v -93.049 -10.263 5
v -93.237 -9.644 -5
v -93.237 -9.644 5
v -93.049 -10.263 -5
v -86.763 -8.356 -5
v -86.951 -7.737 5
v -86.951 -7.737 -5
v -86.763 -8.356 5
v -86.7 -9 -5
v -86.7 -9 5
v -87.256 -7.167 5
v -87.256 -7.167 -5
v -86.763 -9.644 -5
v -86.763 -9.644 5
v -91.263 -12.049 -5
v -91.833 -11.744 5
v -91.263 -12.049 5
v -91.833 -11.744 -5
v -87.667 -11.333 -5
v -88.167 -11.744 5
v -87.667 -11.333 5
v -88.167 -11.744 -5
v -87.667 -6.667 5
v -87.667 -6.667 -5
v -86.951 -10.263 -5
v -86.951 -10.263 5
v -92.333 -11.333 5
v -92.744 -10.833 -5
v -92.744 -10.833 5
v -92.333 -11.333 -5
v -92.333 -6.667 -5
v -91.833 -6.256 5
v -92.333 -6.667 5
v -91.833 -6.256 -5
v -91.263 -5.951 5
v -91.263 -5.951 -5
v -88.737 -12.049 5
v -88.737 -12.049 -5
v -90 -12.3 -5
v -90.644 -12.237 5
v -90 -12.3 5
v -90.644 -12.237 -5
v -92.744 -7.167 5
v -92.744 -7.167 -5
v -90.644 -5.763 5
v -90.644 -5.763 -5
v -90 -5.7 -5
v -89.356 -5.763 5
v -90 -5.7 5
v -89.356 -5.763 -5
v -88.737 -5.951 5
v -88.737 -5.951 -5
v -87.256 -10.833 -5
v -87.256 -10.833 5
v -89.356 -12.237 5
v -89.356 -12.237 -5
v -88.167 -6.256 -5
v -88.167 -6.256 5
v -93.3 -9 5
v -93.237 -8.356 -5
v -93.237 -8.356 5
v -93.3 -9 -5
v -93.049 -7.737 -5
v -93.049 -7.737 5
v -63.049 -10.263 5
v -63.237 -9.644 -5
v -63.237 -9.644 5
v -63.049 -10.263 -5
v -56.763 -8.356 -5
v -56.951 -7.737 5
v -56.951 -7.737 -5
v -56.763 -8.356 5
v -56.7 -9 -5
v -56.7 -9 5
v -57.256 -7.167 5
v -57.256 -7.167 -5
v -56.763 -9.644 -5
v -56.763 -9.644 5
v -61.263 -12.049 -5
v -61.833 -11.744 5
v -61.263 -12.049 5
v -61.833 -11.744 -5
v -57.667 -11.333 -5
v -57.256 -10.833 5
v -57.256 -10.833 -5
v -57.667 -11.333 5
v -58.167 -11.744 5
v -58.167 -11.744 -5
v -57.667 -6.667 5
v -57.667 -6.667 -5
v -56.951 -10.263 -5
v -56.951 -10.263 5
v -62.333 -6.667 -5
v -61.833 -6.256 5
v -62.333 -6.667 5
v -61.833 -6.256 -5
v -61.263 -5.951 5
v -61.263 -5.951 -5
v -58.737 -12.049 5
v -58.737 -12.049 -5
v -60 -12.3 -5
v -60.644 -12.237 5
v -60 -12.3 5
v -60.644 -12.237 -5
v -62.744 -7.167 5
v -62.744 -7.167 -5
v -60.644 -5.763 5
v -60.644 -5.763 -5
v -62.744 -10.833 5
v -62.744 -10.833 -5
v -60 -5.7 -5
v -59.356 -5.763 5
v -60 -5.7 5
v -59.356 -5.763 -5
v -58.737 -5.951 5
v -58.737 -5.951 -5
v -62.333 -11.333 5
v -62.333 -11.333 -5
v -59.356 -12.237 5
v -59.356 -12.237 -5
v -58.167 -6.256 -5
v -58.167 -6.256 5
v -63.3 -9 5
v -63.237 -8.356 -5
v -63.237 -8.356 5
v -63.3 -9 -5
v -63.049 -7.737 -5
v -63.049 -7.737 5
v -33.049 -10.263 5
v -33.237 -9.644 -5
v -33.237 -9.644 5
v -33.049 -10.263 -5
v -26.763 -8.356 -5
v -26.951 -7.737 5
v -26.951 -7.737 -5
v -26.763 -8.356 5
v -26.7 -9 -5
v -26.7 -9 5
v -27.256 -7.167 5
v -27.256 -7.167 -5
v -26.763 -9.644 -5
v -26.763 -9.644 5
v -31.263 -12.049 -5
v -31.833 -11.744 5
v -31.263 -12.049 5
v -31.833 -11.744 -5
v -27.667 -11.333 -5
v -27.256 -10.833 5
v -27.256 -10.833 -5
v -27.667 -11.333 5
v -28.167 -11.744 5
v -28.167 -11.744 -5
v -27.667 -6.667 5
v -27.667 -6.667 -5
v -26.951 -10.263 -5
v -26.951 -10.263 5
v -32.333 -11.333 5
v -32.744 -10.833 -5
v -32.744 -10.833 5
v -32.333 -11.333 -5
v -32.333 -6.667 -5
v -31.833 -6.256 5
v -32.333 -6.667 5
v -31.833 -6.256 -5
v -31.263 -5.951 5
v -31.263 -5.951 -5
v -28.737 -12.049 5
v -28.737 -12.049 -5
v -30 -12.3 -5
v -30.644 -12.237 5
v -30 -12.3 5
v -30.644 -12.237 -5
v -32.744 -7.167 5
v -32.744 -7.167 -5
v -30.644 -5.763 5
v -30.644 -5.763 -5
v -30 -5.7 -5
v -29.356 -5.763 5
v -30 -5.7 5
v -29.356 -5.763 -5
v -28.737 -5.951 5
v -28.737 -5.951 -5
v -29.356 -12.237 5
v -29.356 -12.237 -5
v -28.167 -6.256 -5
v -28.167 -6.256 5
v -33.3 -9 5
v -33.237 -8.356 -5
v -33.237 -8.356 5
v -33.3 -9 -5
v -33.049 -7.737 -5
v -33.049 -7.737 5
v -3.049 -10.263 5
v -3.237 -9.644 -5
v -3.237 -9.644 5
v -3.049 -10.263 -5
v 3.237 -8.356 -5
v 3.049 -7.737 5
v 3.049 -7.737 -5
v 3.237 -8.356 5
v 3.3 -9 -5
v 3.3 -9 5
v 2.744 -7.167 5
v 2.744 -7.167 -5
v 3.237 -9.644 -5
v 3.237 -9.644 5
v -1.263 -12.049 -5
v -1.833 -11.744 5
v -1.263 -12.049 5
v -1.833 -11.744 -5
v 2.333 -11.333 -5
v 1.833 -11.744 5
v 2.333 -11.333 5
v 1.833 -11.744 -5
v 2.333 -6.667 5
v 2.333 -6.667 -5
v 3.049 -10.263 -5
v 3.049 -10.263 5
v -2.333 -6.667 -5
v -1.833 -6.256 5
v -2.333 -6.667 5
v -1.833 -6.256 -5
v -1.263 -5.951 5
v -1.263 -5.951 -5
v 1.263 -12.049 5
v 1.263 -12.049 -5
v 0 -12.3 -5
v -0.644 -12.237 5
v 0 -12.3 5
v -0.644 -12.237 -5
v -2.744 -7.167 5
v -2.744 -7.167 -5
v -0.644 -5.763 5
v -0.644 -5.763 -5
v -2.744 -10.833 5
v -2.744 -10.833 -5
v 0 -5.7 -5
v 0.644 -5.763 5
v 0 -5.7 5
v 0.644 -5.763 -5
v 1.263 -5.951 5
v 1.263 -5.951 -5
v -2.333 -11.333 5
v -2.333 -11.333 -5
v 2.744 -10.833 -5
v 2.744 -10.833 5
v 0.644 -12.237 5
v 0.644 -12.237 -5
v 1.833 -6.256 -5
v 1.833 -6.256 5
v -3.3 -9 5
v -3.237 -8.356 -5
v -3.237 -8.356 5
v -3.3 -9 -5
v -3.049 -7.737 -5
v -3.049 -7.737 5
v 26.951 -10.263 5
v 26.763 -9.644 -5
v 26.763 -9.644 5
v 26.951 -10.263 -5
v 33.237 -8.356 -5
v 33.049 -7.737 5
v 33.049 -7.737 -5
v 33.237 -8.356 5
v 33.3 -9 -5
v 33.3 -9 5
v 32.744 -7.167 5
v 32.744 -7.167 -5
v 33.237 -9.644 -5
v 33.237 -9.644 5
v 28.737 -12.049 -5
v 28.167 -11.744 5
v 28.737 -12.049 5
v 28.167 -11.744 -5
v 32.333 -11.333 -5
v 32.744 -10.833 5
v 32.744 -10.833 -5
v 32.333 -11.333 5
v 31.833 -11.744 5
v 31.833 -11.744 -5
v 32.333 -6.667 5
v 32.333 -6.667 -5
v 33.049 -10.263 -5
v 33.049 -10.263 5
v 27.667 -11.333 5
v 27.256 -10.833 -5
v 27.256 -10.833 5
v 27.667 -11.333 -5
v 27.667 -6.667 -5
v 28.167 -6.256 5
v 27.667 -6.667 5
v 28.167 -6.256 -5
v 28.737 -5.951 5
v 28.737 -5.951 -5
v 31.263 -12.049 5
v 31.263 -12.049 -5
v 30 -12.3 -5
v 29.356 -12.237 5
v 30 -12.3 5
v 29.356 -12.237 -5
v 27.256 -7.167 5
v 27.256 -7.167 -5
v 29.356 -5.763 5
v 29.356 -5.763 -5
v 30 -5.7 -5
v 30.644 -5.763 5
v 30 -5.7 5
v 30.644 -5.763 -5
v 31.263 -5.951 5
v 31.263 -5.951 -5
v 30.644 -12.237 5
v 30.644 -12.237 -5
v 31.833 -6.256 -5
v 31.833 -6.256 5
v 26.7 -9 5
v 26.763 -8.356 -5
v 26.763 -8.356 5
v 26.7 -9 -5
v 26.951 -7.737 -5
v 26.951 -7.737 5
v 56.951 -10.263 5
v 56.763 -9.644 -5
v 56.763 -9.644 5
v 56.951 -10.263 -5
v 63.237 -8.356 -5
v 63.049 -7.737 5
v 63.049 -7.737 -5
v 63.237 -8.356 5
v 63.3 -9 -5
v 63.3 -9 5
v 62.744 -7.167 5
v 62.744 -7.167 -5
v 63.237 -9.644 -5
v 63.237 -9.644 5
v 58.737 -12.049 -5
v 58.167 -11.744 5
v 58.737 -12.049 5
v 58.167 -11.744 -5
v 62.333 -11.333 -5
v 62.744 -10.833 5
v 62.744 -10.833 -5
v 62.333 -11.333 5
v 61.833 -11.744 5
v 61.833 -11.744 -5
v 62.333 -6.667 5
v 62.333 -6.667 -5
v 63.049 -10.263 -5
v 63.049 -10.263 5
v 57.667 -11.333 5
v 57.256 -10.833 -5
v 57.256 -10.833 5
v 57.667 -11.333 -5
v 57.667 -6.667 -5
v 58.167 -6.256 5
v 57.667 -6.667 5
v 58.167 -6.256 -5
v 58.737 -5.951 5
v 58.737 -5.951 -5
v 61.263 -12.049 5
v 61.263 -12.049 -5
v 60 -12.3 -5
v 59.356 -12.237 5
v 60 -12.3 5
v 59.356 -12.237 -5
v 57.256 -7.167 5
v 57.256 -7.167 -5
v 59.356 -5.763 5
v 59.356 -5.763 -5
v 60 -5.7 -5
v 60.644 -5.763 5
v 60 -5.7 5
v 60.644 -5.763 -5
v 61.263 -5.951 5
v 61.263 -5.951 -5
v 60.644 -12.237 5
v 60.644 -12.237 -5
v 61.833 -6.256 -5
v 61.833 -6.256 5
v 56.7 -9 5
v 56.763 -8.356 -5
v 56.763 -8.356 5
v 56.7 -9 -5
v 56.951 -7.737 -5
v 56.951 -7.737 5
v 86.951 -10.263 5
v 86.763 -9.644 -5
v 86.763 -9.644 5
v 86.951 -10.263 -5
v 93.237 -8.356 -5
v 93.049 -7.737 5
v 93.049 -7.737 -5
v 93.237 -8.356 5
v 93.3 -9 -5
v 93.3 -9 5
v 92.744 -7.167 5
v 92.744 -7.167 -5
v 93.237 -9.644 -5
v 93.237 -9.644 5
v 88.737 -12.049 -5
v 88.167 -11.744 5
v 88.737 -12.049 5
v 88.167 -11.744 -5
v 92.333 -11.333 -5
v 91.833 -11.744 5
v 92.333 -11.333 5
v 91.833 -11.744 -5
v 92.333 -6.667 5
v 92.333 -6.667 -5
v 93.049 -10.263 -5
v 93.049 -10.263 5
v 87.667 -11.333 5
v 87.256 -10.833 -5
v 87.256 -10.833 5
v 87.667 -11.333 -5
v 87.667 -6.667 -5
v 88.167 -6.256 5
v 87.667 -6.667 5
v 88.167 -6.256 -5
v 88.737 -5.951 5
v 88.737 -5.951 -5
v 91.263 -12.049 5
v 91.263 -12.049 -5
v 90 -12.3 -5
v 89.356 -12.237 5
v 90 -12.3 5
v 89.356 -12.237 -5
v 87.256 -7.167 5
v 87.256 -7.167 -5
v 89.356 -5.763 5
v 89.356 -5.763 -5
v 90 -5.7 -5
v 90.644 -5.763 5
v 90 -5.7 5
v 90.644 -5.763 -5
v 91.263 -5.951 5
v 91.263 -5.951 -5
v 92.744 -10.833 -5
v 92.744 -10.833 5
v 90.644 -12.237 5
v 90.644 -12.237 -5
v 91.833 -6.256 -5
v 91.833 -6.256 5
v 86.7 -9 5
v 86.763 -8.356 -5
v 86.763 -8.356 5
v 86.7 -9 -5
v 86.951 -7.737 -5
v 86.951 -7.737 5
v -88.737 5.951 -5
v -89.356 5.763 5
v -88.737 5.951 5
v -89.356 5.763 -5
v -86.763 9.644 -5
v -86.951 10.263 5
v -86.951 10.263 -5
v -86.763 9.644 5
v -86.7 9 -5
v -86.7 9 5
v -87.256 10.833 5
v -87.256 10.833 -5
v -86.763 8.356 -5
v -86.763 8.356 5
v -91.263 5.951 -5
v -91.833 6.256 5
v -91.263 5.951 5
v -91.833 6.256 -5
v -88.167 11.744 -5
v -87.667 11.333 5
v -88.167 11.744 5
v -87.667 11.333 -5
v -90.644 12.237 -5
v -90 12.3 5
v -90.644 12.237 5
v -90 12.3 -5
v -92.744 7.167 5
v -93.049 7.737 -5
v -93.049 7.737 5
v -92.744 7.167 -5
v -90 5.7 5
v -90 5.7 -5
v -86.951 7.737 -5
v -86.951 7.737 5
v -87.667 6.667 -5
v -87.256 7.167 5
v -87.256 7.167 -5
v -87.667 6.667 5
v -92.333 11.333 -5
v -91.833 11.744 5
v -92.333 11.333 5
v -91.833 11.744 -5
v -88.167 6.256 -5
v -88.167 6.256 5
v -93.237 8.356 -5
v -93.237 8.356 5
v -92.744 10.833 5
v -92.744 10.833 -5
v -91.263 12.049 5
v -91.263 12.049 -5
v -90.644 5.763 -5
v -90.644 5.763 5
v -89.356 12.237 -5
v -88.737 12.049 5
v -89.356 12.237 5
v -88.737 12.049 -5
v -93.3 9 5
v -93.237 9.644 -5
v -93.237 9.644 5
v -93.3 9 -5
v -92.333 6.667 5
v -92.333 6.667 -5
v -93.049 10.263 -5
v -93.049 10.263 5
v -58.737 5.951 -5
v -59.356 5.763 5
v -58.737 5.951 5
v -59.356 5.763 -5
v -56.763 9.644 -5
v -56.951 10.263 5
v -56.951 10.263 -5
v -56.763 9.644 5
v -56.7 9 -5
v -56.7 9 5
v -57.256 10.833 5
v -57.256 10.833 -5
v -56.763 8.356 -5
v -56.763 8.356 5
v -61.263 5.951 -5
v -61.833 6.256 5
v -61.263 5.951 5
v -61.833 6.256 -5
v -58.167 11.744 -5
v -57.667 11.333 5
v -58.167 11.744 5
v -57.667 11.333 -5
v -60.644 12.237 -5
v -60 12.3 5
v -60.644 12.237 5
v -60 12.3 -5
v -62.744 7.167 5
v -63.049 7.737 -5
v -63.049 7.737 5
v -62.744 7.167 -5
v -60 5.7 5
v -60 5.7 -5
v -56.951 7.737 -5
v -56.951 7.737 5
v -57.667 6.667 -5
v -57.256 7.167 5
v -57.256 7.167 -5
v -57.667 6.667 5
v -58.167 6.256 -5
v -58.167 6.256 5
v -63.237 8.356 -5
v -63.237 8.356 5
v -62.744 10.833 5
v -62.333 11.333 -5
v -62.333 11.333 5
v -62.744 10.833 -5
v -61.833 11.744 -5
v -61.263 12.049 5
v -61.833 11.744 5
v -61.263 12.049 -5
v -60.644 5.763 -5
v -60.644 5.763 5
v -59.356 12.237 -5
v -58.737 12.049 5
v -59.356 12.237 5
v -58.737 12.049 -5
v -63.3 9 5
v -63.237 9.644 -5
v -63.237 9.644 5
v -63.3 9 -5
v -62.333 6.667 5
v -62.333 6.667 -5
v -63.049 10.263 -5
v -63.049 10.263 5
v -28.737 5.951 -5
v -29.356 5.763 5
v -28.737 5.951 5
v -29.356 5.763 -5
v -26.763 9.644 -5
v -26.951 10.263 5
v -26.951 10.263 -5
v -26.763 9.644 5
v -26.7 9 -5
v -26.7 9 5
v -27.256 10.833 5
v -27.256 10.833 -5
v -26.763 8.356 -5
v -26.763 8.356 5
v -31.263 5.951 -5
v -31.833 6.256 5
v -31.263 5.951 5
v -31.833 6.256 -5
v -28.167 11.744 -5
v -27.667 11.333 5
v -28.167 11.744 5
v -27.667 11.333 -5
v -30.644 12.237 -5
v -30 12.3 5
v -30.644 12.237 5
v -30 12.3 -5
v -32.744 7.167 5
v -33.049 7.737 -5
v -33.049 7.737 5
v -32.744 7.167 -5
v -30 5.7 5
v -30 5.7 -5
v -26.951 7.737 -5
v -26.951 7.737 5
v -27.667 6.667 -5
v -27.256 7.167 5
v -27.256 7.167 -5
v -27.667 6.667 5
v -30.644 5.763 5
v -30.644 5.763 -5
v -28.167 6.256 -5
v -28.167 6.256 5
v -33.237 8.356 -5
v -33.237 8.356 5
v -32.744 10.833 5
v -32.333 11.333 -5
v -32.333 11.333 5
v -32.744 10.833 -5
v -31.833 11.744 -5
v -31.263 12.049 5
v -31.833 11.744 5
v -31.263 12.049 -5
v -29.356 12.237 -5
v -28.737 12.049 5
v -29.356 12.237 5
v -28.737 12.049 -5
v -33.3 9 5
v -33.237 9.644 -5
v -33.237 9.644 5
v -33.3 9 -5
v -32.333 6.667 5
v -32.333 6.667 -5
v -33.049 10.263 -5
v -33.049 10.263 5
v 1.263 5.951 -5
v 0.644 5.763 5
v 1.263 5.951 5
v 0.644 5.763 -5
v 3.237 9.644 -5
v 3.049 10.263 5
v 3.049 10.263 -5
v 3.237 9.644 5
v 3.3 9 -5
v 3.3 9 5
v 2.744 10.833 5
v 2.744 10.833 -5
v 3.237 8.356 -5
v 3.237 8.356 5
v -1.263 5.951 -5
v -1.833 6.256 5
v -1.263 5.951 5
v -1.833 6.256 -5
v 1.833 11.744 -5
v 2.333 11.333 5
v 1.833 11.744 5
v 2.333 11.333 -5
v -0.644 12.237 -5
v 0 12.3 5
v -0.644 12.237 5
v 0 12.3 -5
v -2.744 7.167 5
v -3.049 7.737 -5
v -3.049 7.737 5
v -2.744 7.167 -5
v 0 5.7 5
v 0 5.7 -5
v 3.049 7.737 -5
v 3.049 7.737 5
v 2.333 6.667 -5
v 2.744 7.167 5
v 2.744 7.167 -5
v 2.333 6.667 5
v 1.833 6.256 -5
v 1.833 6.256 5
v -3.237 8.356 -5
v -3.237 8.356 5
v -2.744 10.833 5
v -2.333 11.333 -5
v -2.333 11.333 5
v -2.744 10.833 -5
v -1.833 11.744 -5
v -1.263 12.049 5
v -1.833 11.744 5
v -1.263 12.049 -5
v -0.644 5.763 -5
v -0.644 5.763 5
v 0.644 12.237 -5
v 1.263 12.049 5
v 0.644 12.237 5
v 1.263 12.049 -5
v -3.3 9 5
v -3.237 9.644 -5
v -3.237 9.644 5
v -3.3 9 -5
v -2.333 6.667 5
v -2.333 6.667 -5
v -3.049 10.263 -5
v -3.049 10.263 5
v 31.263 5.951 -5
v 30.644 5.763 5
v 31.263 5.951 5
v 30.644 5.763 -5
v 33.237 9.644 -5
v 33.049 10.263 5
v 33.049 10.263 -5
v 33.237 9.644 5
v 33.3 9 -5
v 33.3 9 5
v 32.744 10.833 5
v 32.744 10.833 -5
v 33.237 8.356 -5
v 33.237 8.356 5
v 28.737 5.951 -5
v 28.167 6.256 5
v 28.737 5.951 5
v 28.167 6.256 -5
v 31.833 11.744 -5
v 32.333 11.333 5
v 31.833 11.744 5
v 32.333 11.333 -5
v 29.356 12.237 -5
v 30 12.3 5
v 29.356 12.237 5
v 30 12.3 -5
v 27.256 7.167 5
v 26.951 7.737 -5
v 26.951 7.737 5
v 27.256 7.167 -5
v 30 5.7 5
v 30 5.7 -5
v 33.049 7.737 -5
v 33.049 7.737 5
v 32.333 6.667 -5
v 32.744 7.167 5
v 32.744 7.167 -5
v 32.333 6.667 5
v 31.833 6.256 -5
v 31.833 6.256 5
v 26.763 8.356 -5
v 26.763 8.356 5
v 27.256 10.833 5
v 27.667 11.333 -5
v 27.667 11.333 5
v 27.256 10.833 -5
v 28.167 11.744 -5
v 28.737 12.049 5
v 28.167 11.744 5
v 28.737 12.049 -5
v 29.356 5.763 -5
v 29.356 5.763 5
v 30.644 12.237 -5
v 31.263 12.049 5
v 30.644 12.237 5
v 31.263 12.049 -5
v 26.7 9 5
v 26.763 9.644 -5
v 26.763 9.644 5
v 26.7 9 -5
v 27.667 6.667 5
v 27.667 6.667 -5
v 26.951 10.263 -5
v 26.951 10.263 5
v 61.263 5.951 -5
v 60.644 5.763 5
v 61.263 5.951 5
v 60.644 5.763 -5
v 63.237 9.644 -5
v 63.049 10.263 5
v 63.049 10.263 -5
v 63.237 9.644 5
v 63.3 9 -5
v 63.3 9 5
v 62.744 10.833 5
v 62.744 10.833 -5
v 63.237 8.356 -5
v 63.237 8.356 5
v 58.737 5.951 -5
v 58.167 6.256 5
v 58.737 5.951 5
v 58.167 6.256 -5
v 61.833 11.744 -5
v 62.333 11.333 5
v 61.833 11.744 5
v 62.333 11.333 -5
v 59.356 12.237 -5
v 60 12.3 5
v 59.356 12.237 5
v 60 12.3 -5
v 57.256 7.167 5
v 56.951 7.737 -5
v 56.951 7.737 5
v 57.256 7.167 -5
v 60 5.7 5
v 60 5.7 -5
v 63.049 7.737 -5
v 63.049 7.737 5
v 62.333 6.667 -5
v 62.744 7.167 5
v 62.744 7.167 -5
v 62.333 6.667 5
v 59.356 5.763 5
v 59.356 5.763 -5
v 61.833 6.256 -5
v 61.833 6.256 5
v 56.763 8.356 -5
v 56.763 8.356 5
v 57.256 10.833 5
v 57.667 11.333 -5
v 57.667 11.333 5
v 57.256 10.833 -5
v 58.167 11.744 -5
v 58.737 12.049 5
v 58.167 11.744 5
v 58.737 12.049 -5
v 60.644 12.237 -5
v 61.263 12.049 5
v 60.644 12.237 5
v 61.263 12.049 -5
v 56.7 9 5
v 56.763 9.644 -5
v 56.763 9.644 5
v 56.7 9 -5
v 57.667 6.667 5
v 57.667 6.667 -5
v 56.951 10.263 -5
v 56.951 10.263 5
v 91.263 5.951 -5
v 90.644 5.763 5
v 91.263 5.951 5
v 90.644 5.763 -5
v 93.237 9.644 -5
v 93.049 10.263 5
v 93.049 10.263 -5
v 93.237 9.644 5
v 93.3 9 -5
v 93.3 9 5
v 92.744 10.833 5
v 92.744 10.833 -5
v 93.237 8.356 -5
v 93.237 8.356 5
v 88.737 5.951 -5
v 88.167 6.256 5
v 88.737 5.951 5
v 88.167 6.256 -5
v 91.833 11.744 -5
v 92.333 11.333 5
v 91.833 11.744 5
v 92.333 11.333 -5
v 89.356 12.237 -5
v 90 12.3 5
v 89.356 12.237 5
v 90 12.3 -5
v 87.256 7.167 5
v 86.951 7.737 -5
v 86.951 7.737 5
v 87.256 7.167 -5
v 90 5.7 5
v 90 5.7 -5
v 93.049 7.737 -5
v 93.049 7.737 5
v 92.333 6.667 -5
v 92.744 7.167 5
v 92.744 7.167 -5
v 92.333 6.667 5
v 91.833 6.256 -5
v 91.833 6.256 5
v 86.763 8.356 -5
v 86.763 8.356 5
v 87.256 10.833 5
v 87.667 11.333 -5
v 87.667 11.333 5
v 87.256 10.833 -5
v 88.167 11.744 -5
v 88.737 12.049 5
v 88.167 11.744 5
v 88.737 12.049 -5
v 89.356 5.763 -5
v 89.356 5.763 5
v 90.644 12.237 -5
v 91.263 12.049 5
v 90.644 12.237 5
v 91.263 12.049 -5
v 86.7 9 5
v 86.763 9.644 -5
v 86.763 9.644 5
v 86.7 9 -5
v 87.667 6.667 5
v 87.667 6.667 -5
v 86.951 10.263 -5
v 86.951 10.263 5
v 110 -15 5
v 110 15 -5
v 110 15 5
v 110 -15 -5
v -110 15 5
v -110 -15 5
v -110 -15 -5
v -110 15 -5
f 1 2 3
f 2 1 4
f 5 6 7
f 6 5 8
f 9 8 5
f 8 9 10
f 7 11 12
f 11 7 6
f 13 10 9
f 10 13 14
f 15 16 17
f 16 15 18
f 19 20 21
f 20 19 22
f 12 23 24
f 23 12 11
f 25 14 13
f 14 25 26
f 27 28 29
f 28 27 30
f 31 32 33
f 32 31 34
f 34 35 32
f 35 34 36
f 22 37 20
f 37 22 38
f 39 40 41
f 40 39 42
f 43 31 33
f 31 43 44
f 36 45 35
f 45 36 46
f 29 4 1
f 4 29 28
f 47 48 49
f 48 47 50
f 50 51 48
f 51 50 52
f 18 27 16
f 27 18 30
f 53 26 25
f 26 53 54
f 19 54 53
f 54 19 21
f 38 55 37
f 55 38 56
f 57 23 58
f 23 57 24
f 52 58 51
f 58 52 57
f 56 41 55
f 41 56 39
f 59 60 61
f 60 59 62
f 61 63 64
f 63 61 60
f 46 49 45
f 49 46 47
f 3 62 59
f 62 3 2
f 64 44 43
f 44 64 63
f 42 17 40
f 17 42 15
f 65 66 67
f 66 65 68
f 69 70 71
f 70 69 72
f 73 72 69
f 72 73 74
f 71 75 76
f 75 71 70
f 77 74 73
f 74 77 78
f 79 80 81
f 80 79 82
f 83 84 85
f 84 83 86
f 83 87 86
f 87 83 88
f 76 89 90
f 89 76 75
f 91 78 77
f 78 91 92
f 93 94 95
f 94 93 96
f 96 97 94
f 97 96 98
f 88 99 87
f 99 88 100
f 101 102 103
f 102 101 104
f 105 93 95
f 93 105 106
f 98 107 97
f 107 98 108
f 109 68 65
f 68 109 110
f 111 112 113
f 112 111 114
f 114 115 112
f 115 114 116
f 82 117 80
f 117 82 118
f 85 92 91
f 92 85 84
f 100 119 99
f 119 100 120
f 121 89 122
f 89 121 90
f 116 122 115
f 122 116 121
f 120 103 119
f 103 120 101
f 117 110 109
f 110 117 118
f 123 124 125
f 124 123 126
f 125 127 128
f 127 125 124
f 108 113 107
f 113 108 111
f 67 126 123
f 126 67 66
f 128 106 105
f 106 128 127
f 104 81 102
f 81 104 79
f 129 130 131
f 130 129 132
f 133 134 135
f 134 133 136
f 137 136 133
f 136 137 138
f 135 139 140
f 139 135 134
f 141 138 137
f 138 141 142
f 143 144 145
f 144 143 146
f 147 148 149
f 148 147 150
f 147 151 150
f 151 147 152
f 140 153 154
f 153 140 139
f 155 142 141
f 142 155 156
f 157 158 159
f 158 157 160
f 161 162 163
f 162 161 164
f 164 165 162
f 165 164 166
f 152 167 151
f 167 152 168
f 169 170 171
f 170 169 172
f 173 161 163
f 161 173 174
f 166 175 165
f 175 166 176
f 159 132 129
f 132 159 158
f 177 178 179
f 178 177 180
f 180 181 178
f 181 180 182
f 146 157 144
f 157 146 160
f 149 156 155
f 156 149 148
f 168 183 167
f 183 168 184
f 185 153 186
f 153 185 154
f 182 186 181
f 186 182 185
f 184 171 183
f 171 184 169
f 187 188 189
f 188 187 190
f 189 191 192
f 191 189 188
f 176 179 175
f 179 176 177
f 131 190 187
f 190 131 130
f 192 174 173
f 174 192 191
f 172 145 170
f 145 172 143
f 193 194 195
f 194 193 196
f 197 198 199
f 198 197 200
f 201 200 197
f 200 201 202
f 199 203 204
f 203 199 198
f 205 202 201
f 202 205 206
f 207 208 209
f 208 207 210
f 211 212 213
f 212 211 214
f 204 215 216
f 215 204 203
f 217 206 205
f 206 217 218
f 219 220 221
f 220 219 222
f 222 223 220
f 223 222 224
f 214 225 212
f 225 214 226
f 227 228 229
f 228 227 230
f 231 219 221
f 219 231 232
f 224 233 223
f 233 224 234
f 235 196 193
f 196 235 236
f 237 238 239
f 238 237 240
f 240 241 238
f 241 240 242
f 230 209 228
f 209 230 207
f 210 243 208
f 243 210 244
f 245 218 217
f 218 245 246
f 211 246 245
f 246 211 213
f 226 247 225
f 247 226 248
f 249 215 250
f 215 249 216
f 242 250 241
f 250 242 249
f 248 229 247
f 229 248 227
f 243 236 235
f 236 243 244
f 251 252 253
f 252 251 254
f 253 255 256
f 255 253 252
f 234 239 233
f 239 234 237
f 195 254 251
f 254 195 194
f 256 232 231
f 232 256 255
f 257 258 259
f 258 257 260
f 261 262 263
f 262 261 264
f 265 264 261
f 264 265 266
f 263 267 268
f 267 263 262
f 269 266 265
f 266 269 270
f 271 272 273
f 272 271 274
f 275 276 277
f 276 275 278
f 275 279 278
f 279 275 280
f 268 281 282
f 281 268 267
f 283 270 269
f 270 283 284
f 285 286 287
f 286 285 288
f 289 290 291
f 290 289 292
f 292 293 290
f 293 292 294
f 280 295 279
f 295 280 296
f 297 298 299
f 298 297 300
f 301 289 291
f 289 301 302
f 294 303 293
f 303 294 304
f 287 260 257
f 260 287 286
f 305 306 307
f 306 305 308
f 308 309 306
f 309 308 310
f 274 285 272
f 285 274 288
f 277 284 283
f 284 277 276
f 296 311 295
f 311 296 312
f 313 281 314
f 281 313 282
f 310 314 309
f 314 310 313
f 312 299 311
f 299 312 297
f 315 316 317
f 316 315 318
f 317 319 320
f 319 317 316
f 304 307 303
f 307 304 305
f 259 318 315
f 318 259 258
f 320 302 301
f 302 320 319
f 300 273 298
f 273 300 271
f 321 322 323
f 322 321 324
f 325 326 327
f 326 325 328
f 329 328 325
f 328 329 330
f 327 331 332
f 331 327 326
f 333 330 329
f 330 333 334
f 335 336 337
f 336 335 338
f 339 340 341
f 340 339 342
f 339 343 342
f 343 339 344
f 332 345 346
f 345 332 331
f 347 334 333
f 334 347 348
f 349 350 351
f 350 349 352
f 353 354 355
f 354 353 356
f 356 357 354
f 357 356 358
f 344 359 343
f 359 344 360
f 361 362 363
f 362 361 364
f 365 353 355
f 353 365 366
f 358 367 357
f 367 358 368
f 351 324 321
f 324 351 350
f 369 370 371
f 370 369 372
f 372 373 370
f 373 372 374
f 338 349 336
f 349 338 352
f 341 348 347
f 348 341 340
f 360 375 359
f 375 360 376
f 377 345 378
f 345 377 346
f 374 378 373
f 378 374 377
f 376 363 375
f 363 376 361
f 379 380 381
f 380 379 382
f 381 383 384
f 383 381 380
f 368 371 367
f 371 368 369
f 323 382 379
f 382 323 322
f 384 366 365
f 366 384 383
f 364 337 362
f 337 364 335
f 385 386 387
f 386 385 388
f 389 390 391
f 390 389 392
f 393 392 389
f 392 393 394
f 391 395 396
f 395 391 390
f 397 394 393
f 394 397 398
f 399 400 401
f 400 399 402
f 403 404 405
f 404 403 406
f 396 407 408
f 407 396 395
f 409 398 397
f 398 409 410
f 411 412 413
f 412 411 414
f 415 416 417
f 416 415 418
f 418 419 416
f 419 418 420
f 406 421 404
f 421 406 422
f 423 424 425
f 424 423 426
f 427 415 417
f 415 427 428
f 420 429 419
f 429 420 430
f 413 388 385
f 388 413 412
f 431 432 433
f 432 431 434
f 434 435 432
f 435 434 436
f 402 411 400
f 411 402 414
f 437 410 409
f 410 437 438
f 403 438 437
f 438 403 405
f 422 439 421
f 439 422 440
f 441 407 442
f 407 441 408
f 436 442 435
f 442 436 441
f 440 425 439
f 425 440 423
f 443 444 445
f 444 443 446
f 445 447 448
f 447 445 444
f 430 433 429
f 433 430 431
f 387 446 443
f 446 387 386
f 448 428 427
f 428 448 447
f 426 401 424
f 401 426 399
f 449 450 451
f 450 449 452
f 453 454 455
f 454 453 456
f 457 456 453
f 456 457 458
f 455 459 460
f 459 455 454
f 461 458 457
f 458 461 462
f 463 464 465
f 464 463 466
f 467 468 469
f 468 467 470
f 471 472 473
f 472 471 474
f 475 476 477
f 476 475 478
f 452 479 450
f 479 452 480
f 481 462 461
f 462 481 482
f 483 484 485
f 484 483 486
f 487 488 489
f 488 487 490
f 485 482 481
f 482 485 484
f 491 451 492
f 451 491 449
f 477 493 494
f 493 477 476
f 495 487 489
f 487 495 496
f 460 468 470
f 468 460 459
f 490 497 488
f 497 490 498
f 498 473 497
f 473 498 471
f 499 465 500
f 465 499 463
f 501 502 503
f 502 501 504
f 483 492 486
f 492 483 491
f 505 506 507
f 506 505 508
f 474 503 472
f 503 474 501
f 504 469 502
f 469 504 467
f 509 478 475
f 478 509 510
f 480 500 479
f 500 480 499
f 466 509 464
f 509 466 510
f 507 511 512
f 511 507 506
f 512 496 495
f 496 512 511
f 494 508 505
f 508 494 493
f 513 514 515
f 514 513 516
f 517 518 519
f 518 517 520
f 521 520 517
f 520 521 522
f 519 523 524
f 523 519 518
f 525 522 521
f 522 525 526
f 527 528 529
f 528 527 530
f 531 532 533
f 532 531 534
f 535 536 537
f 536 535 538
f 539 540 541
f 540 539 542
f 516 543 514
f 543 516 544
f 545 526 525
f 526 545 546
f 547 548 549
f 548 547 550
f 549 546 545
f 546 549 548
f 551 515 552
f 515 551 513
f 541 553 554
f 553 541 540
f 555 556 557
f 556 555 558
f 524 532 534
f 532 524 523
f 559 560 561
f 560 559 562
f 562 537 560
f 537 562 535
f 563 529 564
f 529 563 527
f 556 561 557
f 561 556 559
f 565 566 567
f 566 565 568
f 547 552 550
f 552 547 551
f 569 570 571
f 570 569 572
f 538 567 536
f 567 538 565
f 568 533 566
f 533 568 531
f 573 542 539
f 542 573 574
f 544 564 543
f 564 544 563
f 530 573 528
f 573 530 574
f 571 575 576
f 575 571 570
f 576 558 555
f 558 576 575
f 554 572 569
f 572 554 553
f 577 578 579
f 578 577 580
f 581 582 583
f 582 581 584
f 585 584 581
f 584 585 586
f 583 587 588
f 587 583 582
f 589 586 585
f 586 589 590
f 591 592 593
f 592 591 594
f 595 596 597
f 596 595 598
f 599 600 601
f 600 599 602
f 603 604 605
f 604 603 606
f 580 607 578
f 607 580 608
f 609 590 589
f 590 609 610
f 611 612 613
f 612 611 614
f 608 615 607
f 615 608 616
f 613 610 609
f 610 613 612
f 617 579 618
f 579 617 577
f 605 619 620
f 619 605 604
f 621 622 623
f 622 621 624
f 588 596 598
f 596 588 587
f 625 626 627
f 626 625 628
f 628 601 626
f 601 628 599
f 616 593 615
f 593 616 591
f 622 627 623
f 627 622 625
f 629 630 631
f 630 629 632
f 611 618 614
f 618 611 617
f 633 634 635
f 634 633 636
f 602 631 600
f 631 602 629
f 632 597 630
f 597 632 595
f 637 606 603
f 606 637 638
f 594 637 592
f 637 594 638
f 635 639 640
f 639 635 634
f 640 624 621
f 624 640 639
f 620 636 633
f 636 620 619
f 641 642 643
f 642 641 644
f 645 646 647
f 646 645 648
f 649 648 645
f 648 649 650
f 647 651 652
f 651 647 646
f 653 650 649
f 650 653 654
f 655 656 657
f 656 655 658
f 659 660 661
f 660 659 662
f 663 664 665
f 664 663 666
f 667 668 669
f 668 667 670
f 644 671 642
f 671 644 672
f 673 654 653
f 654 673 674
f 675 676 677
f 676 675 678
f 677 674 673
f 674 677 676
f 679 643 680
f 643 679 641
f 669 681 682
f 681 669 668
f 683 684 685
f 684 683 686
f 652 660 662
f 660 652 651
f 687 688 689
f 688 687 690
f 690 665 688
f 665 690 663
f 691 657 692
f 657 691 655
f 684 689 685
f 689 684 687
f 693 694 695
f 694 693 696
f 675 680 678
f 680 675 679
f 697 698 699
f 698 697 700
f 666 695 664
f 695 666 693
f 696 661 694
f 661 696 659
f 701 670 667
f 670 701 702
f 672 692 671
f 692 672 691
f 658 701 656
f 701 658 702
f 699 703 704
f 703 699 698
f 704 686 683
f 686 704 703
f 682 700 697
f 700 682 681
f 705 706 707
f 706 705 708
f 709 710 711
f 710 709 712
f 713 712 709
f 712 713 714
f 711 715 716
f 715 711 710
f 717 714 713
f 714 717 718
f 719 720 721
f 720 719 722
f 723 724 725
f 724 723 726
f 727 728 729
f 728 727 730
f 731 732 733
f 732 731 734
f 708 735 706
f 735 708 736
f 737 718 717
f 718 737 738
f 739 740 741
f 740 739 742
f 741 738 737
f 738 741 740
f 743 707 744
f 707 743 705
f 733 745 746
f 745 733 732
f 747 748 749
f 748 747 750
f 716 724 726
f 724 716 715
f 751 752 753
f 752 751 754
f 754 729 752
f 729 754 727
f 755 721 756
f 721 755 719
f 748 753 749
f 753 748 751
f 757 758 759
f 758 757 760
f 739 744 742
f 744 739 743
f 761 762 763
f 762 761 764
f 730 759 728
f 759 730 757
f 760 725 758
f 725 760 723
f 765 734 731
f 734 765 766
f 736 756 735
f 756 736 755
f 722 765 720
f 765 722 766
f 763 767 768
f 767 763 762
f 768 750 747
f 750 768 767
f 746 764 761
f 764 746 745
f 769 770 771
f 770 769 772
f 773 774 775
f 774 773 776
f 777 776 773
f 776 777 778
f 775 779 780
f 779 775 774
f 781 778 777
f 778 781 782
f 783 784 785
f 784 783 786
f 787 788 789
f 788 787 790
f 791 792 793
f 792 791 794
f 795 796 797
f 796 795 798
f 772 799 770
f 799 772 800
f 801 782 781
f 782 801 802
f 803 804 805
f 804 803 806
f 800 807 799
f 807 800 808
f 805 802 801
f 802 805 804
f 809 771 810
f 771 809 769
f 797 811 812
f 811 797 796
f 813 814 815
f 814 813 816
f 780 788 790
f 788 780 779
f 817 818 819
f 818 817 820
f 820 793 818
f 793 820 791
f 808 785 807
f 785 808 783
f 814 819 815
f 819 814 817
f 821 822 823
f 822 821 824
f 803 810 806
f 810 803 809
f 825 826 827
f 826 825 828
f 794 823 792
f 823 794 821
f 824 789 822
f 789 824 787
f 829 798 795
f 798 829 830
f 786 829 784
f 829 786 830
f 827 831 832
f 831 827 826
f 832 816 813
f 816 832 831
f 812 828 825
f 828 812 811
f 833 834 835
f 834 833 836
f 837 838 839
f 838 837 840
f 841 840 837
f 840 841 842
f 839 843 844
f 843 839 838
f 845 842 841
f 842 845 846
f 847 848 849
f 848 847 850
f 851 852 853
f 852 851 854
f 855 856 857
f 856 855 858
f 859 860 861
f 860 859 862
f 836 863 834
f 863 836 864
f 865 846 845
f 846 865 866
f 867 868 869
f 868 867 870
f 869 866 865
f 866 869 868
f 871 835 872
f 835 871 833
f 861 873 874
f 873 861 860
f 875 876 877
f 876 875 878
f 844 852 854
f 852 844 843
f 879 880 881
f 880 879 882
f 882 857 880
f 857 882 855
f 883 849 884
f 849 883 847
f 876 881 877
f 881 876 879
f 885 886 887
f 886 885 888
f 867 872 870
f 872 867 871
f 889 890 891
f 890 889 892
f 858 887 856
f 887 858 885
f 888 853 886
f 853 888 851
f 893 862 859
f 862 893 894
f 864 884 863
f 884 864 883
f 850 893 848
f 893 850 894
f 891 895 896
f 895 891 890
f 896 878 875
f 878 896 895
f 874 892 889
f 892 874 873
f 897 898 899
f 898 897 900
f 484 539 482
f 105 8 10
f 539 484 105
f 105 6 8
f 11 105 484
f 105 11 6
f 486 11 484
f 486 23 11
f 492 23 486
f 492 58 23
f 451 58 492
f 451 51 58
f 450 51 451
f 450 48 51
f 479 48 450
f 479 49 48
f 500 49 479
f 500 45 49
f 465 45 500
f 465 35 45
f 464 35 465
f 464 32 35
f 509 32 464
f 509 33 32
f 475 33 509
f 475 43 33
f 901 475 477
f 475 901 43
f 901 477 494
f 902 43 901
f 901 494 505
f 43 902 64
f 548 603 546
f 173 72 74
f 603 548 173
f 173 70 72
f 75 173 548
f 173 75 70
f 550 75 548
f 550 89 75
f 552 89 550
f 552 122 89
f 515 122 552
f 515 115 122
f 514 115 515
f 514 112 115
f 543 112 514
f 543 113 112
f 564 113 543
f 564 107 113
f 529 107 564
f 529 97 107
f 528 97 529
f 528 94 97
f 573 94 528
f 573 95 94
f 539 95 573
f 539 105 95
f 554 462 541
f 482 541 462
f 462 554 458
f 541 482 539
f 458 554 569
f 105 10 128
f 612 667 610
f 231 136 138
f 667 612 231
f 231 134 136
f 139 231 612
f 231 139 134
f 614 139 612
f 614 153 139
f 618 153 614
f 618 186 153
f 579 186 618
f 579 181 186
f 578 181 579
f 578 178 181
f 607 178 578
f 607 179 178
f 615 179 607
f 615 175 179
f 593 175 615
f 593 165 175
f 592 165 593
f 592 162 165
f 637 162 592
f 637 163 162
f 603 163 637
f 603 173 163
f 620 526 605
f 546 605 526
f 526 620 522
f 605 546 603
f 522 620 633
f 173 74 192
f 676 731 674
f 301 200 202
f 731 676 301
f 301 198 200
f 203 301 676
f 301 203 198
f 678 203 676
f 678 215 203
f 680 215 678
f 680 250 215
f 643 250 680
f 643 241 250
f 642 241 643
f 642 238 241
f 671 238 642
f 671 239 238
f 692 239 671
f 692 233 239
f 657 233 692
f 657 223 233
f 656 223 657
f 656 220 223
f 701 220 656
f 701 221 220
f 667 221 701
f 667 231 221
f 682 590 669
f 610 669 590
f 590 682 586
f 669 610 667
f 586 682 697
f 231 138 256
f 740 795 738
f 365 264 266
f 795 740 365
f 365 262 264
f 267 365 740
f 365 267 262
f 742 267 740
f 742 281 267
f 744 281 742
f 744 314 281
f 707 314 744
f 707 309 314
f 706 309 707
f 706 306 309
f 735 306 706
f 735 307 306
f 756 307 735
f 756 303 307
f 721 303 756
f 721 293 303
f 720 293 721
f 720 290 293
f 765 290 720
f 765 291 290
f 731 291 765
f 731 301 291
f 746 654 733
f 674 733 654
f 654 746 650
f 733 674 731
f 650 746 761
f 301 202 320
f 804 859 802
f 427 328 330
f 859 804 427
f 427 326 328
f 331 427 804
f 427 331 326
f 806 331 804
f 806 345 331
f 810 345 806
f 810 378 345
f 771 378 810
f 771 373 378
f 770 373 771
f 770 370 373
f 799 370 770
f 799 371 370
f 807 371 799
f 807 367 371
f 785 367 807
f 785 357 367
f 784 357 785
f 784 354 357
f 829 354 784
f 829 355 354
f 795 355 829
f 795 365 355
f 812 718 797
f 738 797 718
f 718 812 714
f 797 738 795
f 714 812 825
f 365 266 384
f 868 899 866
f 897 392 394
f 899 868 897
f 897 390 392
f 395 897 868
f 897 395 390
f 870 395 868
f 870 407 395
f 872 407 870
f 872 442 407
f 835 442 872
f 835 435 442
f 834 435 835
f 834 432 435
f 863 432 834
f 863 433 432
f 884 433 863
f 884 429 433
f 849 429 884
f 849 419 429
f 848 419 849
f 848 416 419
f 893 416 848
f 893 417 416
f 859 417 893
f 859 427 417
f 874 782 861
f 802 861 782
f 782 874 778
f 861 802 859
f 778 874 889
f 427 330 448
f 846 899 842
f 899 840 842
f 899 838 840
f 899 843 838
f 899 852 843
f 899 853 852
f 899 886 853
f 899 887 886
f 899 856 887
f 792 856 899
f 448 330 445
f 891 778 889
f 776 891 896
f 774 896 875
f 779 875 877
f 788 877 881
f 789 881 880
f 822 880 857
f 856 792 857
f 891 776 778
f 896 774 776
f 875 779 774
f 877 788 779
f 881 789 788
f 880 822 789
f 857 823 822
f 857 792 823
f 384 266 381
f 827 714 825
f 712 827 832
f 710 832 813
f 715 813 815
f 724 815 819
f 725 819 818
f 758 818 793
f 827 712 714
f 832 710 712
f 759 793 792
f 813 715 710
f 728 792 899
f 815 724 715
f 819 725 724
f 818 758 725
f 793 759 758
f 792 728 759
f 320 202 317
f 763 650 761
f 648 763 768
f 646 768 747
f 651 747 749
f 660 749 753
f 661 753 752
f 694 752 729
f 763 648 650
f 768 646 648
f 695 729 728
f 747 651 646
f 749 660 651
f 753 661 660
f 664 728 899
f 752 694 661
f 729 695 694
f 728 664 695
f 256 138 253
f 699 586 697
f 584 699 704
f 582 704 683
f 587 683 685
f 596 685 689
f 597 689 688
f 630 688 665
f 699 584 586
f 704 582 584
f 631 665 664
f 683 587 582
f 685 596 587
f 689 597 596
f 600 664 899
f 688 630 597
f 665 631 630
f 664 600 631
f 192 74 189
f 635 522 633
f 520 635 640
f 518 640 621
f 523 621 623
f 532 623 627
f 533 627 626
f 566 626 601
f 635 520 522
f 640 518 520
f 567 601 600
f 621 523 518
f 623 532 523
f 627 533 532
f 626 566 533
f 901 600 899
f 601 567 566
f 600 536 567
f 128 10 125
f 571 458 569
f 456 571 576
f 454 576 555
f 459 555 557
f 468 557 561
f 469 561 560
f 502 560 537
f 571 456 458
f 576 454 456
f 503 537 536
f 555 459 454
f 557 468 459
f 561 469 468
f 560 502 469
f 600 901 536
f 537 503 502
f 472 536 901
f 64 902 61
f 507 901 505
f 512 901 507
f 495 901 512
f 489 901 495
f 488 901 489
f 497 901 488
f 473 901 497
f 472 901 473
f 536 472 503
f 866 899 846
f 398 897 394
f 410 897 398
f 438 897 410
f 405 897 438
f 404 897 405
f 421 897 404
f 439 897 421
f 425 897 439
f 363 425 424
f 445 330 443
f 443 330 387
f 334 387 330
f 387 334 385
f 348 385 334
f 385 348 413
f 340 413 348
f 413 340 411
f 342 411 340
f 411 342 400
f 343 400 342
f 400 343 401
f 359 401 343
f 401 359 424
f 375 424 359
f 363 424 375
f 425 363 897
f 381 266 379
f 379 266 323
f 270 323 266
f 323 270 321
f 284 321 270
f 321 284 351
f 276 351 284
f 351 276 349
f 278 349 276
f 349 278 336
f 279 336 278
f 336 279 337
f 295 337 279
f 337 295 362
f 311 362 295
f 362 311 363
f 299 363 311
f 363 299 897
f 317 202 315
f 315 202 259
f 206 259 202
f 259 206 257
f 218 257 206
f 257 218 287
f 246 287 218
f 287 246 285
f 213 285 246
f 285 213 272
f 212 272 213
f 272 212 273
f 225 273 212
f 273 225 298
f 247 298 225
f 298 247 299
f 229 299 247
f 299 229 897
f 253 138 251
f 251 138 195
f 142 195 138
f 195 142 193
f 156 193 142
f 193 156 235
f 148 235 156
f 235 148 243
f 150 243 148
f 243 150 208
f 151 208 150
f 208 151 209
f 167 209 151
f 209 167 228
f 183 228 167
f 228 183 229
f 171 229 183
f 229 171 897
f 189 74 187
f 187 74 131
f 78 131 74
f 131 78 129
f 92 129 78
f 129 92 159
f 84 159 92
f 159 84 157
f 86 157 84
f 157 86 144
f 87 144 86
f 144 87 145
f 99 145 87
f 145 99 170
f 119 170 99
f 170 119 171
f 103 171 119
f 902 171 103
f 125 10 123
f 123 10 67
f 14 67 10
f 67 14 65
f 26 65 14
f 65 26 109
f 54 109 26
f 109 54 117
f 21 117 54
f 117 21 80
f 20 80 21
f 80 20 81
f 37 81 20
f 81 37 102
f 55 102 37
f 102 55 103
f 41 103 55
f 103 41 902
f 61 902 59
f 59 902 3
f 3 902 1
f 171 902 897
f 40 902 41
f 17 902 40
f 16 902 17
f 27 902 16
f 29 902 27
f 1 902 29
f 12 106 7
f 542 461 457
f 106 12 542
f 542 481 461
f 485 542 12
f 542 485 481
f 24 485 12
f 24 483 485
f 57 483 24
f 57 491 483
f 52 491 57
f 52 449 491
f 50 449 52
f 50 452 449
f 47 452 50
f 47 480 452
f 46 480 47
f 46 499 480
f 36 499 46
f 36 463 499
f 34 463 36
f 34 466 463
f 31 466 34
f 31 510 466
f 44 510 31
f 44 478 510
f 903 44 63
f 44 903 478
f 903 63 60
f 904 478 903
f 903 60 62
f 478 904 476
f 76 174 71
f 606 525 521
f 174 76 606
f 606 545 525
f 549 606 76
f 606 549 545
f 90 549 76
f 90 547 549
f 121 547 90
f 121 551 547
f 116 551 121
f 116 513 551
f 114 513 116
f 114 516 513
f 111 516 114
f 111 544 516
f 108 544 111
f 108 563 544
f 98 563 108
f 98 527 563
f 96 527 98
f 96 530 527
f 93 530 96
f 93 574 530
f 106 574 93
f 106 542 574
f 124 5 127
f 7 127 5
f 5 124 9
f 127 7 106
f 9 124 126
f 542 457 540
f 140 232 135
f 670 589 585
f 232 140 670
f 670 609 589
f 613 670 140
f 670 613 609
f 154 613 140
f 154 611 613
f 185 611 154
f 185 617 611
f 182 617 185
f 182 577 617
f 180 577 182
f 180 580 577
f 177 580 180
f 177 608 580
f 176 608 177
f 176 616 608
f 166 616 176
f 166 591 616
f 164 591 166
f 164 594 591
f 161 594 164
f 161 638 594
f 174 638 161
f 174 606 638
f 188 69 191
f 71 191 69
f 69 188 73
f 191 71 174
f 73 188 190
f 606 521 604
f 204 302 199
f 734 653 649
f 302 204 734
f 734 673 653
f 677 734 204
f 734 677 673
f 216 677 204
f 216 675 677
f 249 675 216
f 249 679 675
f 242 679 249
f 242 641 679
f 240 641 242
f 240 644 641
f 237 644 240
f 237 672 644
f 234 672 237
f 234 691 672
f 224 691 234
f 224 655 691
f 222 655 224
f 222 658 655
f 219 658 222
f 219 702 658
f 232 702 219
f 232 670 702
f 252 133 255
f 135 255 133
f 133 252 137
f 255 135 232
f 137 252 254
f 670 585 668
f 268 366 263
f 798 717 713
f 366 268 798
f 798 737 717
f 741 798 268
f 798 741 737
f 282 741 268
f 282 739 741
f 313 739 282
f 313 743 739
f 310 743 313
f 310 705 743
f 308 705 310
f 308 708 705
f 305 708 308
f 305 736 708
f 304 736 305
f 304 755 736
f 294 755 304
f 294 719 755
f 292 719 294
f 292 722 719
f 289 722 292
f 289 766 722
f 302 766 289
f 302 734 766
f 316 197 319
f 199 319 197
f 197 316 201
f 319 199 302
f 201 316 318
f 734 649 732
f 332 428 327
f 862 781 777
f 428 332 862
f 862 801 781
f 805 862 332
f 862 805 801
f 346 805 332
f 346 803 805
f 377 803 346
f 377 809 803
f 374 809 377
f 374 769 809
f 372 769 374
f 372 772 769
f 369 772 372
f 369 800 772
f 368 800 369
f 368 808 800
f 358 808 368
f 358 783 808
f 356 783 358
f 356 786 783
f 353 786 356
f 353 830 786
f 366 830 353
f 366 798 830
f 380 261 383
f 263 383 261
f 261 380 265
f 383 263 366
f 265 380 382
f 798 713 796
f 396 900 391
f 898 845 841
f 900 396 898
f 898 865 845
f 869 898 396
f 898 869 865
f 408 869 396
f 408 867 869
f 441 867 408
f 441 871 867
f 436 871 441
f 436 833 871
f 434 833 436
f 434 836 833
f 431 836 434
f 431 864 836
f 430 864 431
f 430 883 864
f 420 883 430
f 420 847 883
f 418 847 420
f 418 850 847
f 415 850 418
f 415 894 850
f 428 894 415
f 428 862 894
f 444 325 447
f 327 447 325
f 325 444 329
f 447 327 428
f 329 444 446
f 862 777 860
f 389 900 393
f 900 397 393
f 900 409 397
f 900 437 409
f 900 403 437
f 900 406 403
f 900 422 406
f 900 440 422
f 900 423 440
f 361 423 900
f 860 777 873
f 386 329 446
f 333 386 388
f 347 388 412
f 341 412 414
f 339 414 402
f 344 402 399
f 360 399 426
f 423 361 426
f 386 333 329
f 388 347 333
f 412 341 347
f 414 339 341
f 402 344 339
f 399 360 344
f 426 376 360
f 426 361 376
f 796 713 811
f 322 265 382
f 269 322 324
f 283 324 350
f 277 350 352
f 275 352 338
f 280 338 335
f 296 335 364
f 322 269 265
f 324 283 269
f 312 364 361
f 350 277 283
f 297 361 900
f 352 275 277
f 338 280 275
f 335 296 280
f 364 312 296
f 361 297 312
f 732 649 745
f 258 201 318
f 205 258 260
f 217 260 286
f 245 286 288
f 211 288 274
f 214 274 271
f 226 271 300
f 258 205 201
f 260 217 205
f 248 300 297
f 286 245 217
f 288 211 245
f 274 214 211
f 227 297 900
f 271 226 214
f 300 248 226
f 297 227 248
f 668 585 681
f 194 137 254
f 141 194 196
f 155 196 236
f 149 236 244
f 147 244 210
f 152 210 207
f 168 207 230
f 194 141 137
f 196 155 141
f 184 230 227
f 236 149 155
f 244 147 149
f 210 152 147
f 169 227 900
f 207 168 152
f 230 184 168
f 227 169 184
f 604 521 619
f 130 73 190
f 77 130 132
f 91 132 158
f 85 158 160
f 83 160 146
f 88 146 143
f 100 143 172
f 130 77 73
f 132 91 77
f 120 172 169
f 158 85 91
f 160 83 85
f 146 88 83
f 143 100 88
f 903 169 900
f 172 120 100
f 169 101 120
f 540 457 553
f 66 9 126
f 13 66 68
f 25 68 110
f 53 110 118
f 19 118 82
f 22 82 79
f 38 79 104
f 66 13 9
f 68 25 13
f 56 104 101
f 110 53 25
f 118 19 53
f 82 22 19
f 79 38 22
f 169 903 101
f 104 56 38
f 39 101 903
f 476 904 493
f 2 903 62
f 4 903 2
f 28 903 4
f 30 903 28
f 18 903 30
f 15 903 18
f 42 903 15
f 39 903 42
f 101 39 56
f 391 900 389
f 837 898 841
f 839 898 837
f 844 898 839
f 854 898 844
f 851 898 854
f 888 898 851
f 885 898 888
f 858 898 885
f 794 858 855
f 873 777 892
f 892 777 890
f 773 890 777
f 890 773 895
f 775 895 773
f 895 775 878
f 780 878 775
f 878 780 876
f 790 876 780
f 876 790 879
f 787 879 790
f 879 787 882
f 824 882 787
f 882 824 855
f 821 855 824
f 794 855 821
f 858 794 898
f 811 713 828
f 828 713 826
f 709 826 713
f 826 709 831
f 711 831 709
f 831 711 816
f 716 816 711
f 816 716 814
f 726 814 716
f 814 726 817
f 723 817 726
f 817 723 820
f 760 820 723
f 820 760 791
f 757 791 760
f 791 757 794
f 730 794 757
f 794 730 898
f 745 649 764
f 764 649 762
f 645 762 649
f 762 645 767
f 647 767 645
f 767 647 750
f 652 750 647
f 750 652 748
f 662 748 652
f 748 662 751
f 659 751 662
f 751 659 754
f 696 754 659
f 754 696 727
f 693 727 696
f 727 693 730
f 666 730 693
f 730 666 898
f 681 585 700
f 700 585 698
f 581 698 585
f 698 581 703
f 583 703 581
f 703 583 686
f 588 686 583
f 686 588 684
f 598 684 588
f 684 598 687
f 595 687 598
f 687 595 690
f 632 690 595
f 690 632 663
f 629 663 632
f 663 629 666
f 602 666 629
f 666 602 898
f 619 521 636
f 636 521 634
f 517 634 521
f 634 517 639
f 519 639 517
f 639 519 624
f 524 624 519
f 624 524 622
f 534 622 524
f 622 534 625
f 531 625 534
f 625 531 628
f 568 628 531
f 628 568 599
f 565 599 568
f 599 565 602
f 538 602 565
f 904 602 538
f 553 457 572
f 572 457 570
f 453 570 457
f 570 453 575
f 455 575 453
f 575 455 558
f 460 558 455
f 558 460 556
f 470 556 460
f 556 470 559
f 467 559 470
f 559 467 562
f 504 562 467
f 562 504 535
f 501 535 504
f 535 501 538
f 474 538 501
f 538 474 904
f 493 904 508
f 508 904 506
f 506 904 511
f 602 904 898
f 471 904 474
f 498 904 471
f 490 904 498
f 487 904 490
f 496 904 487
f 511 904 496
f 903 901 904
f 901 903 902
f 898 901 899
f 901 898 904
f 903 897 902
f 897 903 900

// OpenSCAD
$fn = 32;

// ----------------------------------------------------------------------
// Hole bar, 7 x Ø6.6
// tworows layout, 20 mm edge offset
// ----------------------------------------------------------------------

// --- parameters (mm) ---
bar_w = 30;       // bar width (Y)
bar_t = 10;       // bar thickness (Z)
holes = 7;        // holes per row
hole_d = 6.6;     // hole diameter
edge = 20;        // offset from the bar end to the first hole
pitch = 30;       // pitch between neighbouring holes
row_offset = 18;  // distance between the two rows

// --- derived feature positions (mm) ---
span = (holes - 1) * pitch;   // = 180   distance between the end holes
bar_l = span + 2 * edge;      // = 220   overall bar length
start_x = -bar_l / 2 + edge;  // = -90   X of the first hole
feature_centers = [
  [start_x + 0 * pitch, -row_offset / 2],
  [start_x + 1 * pitch, -row_offset / 2],
  [start_x + 2 * pitch, -row_offset / 2],
  [start_x + 3 * pitch, -row_offset / 2],
  [start_x + 4 * pitch, -row_offset / 2],
  [start_x + 5 * pitch, -row_offset / 2],
  [start_x + 6 * pitch, -row_offset / 2]
];   // hole centres of the first row
row2_centers = [
  [start_x + 0 * pitch, row_offset / 2],
  [start_x + 1 * pitch, row_offset / 2],
  [start_x + 2 * pitch, row_offset / 2],
  [start_x + 3 * pitch, row_offset / 2],
  [start_x + 4 * pitch, row_offset / 2],
  [start_x + 5 * pitch, row_offset / 2],
  [start_x + 6 * pitch, row_offset / 2]
];   // hole centres of the second row

// bar with two rows of holes, both read from their own centre arrays
difference() {
  translate([-bar_l / 2, -bar_w / 2, -bar_t / 2]) cube([bar_l, bar_w, bar_t]);
  for (centre = feature_centers)
    translate([centre[0], centre[1], 0])
      cylinder(d = hole_d, h = bar_t + 2, center = true);
  for (centre = row2_centers)
    translate([centre[0], centre[1], 0])
      cylinder(d = hole_d, h = bar_t + 2, center = true);
}
